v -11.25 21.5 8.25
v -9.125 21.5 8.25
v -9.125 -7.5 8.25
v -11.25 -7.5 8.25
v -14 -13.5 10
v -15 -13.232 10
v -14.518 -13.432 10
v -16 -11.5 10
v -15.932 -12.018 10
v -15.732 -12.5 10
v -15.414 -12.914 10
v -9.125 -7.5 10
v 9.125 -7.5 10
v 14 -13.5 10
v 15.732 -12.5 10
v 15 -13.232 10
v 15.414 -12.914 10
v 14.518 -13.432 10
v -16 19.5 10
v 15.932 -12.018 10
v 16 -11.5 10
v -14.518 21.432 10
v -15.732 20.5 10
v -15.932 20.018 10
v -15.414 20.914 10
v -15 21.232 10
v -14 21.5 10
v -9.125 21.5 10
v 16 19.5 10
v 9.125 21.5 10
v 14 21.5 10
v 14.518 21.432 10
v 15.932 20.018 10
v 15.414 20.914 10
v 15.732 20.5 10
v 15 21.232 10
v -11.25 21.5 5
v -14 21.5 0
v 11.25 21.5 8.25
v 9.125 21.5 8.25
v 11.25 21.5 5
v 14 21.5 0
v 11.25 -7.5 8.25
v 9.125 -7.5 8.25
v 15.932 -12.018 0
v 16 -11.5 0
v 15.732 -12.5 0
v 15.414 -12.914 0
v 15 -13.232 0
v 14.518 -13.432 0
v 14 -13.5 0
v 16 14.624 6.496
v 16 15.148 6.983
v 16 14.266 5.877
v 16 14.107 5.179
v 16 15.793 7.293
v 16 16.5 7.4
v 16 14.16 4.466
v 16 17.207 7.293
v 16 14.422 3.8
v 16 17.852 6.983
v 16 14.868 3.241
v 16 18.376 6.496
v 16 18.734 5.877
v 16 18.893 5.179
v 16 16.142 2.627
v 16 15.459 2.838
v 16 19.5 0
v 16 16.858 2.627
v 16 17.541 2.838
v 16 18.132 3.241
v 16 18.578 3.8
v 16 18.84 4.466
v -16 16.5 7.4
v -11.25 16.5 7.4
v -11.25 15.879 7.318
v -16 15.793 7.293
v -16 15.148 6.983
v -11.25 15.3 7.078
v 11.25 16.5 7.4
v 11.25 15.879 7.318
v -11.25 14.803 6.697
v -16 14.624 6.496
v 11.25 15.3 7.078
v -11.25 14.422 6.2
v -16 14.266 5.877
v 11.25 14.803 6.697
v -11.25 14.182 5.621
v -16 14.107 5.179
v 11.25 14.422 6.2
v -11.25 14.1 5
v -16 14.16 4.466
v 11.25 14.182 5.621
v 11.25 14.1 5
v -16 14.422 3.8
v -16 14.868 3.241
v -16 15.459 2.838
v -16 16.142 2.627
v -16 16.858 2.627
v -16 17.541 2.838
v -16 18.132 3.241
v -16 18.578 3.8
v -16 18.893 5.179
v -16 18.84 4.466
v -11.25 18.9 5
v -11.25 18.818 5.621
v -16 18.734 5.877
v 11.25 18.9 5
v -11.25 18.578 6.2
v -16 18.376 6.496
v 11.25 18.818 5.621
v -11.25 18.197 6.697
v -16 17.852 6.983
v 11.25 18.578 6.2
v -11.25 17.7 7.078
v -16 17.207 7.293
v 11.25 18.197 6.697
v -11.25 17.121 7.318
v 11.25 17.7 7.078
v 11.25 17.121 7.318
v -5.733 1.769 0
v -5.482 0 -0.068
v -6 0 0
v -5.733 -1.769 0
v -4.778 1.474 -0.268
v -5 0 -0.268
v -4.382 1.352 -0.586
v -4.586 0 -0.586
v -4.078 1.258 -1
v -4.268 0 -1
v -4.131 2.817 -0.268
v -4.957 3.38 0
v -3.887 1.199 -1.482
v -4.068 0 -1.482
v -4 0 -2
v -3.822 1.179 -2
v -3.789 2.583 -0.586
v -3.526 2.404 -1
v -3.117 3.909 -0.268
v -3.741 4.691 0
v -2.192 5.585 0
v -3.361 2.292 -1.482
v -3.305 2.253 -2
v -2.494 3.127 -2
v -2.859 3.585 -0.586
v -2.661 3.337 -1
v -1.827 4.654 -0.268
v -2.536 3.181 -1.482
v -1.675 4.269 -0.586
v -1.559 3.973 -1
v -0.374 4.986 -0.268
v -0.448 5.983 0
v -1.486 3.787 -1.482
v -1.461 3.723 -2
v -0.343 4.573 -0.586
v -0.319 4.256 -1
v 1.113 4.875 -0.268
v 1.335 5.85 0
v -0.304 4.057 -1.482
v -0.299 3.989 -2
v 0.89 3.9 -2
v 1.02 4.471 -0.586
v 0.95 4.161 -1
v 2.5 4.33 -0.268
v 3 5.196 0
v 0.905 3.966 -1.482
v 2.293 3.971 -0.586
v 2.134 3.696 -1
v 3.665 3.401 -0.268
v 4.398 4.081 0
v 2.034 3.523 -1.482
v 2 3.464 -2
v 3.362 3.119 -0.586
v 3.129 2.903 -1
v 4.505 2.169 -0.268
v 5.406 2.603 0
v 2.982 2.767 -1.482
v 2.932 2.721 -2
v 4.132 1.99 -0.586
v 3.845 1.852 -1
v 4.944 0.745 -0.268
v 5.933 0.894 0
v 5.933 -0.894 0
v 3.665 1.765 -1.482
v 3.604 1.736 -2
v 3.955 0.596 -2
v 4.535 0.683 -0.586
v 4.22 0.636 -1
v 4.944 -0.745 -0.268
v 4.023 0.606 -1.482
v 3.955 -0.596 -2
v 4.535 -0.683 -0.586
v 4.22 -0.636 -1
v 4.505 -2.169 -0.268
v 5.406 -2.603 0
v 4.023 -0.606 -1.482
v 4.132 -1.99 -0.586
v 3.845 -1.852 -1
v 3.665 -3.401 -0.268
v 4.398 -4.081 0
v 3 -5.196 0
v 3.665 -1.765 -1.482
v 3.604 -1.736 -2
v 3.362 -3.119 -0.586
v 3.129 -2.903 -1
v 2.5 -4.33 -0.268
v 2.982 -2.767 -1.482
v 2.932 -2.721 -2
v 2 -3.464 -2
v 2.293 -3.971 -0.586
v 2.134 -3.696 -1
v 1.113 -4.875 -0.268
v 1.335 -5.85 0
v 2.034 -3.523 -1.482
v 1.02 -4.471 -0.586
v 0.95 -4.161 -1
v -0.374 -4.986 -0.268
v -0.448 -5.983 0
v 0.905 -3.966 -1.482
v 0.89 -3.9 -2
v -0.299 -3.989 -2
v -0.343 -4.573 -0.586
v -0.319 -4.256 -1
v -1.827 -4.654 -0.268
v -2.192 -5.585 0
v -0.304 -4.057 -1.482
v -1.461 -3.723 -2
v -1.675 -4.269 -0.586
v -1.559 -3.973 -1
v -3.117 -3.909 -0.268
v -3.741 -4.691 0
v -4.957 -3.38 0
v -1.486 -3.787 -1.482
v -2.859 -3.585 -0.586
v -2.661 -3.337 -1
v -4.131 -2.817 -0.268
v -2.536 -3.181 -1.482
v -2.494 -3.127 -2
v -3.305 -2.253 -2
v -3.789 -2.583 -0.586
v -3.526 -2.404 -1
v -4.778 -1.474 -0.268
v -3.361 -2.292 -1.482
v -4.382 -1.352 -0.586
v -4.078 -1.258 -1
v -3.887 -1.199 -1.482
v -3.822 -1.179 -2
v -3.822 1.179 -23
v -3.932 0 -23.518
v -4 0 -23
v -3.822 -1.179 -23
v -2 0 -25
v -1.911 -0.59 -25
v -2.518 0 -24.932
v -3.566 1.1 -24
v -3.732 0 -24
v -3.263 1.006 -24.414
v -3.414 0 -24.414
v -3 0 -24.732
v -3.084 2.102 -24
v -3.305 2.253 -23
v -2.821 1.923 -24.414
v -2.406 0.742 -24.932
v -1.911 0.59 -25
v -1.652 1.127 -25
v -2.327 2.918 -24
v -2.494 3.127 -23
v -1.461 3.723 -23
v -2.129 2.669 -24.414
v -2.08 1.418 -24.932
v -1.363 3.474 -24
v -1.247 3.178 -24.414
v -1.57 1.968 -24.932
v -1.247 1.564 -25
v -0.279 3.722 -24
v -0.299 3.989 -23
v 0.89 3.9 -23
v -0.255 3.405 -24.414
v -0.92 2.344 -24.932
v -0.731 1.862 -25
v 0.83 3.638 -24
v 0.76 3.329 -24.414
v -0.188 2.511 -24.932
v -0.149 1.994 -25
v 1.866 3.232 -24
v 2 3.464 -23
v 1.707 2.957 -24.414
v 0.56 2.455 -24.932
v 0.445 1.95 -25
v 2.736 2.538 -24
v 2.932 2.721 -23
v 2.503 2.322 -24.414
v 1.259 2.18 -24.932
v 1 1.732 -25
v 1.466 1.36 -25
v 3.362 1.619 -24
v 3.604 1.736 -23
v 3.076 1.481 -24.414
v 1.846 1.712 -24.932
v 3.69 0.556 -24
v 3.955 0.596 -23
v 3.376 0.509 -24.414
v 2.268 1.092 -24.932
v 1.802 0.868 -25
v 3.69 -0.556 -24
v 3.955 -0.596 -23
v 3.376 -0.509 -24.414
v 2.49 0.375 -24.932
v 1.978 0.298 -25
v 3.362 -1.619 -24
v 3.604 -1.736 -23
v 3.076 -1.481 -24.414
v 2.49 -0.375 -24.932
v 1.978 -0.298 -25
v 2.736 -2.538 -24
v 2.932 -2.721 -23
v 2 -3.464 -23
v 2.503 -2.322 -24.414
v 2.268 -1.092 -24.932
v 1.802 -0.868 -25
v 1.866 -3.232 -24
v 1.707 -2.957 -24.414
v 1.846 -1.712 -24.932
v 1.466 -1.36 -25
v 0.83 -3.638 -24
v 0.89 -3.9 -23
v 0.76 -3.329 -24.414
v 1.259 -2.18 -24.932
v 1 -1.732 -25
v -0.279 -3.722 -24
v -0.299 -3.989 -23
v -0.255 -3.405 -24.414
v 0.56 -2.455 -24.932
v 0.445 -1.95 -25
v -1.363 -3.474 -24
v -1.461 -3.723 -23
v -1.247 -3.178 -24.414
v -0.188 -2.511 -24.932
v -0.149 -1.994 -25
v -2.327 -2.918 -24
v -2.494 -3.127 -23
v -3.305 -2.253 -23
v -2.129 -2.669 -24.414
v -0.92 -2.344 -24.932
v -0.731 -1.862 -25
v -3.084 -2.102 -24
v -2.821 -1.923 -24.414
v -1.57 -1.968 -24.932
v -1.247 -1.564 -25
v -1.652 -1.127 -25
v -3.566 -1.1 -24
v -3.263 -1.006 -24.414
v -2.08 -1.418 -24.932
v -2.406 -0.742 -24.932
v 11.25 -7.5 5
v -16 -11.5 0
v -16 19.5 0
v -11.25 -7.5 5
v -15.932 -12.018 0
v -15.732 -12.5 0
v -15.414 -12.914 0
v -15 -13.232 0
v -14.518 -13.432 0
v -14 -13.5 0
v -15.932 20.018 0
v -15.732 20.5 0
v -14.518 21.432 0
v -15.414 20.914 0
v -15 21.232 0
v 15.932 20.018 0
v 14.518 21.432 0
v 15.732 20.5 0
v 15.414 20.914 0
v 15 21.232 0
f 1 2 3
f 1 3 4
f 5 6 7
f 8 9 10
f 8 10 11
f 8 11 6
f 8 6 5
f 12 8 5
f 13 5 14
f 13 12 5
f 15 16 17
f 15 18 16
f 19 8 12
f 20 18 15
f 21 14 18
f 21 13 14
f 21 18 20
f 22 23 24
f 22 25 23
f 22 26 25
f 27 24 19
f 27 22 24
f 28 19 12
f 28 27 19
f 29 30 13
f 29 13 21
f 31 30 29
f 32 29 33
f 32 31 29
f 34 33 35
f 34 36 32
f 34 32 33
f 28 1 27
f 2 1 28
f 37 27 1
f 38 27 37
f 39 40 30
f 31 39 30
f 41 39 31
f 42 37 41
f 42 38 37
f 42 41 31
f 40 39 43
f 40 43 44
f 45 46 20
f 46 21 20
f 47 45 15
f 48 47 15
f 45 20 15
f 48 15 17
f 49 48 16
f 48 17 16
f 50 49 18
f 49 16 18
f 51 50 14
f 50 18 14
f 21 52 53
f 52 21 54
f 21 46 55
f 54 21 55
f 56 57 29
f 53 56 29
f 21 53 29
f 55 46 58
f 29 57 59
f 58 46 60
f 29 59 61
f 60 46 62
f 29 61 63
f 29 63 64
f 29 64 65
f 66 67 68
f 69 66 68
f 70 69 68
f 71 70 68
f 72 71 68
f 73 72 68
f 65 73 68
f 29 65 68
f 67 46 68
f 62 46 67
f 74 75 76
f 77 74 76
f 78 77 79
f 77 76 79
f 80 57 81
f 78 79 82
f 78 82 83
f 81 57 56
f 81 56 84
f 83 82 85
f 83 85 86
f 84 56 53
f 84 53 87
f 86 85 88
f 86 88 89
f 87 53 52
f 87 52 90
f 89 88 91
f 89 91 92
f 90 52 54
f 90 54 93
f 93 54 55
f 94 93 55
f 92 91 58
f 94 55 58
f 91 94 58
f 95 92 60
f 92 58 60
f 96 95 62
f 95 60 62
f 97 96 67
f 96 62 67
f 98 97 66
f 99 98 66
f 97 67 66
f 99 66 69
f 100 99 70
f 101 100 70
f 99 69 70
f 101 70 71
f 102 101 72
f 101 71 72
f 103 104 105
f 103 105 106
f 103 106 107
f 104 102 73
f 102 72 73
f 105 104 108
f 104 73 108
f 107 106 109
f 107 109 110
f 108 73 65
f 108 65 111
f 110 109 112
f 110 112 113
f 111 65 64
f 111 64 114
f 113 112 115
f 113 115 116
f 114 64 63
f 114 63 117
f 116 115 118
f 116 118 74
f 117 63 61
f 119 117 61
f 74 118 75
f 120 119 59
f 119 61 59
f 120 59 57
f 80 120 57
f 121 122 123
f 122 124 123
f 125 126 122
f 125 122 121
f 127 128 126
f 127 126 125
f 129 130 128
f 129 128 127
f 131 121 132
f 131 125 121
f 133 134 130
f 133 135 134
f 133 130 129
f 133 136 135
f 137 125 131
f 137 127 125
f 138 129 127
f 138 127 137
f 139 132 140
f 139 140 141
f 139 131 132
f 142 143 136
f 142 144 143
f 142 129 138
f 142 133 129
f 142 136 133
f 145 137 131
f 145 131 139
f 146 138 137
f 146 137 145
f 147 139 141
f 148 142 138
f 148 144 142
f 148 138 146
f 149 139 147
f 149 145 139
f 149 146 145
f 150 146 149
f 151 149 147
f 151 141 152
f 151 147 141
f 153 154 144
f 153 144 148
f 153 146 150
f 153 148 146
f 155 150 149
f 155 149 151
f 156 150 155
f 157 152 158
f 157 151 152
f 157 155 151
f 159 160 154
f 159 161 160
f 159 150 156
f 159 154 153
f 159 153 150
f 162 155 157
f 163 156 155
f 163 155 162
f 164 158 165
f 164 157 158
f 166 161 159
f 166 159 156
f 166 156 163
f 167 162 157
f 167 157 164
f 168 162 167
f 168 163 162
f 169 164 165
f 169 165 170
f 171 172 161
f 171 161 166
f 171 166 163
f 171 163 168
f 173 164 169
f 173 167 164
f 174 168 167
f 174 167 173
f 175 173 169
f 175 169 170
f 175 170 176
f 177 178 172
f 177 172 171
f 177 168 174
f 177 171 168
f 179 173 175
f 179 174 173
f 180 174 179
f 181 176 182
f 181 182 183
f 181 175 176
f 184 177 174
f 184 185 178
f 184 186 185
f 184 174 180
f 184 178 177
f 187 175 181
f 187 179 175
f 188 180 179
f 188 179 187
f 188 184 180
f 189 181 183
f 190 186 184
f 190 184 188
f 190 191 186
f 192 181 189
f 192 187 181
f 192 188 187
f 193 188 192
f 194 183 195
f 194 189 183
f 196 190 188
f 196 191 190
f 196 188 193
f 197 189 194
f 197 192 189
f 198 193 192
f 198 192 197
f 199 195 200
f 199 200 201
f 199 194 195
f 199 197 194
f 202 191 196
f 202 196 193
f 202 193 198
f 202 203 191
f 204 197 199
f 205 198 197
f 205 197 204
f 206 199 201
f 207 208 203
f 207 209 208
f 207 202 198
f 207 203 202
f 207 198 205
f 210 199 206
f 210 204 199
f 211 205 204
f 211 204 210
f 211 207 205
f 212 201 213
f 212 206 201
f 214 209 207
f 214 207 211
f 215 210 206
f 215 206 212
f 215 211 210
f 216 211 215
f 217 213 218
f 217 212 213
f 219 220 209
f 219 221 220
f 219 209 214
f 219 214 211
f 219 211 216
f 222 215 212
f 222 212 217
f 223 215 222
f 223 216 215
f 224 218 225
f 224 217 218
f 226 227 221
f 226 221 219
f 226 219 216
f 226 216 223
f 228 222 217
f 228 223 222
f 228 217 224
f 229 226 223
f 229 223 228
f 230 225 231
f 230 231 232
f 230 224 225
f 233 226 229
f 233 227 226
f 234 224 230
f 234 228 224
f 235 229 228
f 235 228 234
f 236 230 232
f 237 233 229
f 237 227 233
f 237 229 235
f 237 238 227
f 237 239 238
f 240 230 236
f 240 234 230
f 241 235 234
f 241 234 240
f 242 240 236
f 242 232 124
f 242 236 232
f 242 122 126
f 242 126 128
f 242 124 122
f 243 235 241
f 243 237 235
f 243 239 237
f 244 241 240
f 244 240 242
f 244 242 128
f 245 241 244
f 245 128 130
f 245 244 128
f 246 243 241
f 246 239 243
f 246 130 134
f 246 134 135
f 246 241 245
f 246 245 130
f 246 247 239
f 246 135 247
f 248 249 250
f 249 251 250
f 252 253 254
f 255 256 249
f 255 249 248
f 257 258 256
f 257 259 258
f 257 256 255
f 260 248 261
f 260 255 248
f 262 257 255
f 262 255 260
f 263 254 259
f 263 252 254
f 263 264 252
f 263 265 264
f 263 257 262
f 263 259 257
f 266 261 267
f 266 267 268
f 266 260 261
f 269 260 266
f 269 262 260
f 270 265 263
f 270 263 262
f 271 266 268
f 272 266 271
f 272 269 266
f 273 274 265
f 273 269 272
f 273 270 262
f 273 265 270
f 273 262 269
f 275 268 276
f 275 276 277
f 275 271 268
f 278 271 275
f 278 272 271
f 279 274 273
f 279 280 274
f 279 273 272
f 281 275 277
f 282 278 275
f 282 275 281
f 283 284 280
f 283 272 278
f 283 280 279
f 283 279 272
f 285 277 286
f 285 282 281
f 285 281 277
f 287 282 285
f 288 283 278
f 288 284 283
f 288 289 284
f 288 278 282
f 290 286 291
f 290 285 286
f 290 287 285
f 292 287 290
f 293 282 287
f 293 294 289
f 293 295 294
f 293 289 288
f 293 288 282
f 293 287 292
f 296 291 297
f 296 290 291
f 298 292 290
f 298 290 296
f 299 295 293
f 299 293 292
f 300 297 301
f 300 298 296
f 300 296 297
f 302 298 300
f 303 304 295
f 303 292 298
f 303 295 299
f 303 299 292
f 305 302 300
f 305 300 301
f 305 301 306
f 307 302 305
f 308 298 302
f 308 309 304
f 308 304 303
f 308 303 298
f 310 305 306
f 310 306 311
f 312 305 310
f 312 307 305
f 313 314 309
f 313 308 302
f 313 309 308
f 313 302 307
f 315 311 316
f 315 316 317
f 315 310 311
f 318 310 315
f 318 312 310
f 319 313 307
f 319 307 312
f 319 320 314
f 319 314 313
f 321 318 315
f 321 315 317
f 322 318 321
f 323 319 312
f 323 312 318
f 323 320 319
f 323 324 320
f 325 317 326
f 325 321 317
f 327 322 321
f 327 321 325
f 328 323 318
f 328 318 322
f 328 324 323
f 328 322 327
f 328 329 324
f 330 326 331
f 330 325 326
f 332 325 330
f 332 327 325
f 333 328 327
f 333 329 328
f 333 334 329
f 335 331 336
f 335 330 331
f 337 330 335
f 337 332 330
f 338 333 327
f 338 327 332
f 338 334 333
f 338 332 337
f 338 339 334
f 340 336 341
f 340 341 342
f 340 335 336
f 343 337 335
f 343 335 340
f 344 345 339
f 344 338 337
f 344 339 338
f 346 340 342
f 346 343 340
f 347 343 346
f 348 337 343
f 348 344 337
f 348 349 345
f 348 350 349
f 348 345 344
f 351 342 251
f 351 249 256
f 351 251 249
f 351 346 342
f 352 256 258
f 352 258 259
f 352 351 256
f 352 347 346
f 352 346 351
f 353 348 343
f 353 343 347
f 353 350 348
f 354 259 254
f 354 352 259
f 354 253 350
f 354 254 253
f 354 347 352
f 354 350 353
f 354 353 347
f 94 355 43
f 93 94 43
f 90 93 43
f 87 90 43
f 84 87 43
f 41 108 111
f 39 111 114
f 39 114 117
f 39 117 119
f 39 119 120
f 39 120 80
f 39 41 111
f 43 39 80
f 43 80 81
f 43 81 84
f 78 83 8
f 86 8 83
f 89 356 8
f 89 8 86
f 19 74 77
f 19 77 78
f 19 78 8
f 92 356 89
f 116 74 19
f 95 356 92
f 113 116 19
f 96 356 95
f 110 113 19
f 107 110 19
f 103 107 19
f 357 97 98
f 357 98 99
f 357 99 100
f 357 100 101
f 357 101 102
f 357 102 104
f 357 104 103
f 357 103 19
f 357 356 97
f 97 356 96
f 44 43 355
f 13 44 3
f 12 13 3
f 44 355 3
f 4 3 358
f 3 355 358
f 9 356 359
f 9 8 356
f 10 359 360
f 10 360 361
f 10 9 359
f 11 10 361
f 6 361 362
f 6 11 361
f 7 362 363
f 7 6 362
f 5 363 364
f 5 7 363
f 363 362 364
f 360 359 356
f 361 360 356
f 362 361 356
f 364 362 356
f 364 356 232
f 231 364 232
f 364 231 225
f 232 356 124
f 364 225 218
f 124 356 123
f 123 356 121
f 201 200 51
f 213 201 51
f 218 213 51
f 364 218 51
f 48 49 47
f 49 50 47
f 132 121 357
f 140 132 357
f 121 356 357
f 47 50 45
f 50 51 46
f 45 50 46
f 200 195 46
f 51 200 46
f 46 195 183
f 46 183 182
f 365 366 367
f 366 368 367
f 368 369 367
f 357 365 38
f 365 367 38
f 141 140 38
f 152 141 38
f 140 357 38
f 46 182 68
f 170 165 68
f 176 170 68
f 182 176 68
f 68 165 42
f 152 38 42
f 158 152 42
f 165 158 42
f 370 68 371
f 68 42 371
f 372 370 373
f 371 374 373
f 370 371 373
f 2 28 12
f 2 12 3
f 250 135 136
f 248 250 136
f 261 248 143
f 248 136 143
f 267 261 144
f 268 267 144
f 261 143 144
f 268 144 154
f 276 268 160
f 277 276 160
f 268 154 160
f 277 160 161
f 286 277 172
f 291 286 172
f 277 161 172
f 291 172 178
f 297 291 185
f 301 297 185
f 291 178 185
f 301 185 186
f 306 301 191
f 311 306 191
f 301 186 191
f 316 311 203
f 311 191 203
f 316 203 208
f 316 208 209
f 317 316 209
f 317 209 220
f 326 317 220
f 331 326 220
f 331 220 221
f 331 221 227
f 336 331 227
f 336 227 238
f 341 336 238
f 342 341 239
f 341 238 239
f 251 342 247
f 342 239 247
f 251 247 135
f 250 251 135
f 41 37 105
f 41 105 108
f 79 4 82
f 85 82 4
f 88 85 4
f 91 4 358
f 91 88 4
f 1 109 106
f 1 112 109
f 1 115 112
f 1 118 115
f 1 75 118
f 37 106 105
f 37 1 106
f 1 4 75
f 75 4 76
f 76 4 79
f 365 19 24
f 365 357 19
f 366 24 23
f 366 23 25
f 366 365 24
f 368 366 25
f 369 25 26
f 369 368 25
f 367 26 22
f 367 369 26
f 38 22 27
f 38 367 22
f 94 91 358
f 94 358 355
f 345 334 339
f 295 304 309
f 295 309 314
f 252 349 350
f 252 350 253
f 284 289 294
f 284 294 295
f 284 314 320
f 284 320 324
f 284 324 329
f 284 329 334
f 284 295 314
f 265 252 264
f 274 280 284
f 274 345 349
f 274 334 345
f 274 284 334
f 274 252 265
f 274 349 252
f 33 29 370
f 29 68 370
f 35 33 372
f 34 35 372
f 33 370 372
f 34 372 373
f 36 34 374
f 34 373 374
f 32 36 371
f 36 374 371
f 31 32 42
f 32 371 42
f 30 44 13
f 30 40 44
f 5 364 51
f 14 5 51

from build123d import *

# Parameters (mm, degrees)
SKETCH1_W               = 32
SKETCH1_H               = 27
BOSS_EXTRUDE1_DEPTH     = 10
SKETCH3_R               = 4
BOSS_EXTRUDE2_DEPTH     = 25
SKETCH4_W               = 32
SKETCH4_H               = 10
BOSS_EXTRUDE3_DEPTH     = 8
CUT_EXTRUDE4_DEPTH      = 9
CUT_EXTRUDE4_DEPTH_BACK = 21
SKETCH6_W               = 2.4
SKETCH6_H               = 32
FILLET1_R               = 2


with BuildPart() as part:
    # Sketch1 → Boss-Extrude1 (new body)
    with BuildSketch(Plane.XY):
        Rectangle(SKETCH1_W, SKETCH1_H)
    extrude(amount=BOSS_EXTRUDE1_DEPTH)

    # Sketch3 → Boss-Extrude2 (add)
    with BuildSketch(Plane(origin=(0, 0, 0), x_dir=(-1, 0, 0), z_dir=(0, 0, -1))):
        Circle(SKETCH3_R)
    extrude(amount=BOSS_EXTRUDE2_DEPTH)


with BuildPart() as body_2:
    # Sketch4 → Boss-Extrude3 (new body)
    with BuildSketch(Plane(origin=(0, 13.5, 0), x_dir=(1, 0, 0), z_dir=(0, 1, 0))):
        with Locations((0, -5)):
            Rectangle(SKETCH4_W, SKETCH4_H)
    extrude(amount=BOSS_EXTRUDE3_DEPTH)


with BuildPart() as cut_extrude4_tool:
    # Sketch2 → Cut-Extrude4 (new body, two sides)
    with BuildSketch(Plane(origin=(0, 13.5, 0), x_dir=(1, 0, 0), z_dir=(0, 1, 0))) as cut_extrude4_sk:
        Polygon((-9.125, -10), (-9.125, -8.25), (-11.25, -8.25), (-11.25, -5), (11.25, -5), (11.25, -8.25), (9.125, -8.25), (9.125, -10), align=None)
    extrude(amount=CUT_EXTRUDE4_DEPTH)
    extrude(cut_extrude4_sk.sketch, amount=-CUT_EXTRUDE4_DEPTH_BACK)


with BuildPart() as part_1:
    add(part.part)

    # Cut-Extrude4: cut by cut_extrude4_tool
    add(cut_extrude4_tool.part, mode=Mode.SUBTRACT)


with BuildPart() as body_2_1:
    add(body_2.part)

    # Cut-Extrude4: cut by cut_extrude4_tool
    add(cut_extrude4_tool.part, mode=Mode.SUBTRACT)

    # Sketch6 → M4 Clearance Hole1 (revolve, cut)
    with BuildSketch(Plane(origin=(-16, 16.5, 5), x_dir=(0, 0, 1), z_dir=(0, 1, 0))):
        with Locations((1.2, 16)):
            Rectangle(SKETCH6_W, SKETCH6_H)
    revolve(axis=Axis((-22.35, 16.5, 5), (1, 0, 0)), mode=Mode.SUBTRACT)

    # Combine1: union part
    add(part_1.part)

    # Fillet1
    fillet1_edges = [body_2_1.edges().sort_by_distance(p)[0] for p in [
        (16, 21.5, 5),
        (-16, 21.5, 5),
        (-16, -13.5, 5),
        (16, -13.5, 5),
        (4, 0, 0),
        (4, 0, -25),
    ]]
    fillet(fillet1_edges, radius=FILLET1_R)


solid = body_2_1.part
